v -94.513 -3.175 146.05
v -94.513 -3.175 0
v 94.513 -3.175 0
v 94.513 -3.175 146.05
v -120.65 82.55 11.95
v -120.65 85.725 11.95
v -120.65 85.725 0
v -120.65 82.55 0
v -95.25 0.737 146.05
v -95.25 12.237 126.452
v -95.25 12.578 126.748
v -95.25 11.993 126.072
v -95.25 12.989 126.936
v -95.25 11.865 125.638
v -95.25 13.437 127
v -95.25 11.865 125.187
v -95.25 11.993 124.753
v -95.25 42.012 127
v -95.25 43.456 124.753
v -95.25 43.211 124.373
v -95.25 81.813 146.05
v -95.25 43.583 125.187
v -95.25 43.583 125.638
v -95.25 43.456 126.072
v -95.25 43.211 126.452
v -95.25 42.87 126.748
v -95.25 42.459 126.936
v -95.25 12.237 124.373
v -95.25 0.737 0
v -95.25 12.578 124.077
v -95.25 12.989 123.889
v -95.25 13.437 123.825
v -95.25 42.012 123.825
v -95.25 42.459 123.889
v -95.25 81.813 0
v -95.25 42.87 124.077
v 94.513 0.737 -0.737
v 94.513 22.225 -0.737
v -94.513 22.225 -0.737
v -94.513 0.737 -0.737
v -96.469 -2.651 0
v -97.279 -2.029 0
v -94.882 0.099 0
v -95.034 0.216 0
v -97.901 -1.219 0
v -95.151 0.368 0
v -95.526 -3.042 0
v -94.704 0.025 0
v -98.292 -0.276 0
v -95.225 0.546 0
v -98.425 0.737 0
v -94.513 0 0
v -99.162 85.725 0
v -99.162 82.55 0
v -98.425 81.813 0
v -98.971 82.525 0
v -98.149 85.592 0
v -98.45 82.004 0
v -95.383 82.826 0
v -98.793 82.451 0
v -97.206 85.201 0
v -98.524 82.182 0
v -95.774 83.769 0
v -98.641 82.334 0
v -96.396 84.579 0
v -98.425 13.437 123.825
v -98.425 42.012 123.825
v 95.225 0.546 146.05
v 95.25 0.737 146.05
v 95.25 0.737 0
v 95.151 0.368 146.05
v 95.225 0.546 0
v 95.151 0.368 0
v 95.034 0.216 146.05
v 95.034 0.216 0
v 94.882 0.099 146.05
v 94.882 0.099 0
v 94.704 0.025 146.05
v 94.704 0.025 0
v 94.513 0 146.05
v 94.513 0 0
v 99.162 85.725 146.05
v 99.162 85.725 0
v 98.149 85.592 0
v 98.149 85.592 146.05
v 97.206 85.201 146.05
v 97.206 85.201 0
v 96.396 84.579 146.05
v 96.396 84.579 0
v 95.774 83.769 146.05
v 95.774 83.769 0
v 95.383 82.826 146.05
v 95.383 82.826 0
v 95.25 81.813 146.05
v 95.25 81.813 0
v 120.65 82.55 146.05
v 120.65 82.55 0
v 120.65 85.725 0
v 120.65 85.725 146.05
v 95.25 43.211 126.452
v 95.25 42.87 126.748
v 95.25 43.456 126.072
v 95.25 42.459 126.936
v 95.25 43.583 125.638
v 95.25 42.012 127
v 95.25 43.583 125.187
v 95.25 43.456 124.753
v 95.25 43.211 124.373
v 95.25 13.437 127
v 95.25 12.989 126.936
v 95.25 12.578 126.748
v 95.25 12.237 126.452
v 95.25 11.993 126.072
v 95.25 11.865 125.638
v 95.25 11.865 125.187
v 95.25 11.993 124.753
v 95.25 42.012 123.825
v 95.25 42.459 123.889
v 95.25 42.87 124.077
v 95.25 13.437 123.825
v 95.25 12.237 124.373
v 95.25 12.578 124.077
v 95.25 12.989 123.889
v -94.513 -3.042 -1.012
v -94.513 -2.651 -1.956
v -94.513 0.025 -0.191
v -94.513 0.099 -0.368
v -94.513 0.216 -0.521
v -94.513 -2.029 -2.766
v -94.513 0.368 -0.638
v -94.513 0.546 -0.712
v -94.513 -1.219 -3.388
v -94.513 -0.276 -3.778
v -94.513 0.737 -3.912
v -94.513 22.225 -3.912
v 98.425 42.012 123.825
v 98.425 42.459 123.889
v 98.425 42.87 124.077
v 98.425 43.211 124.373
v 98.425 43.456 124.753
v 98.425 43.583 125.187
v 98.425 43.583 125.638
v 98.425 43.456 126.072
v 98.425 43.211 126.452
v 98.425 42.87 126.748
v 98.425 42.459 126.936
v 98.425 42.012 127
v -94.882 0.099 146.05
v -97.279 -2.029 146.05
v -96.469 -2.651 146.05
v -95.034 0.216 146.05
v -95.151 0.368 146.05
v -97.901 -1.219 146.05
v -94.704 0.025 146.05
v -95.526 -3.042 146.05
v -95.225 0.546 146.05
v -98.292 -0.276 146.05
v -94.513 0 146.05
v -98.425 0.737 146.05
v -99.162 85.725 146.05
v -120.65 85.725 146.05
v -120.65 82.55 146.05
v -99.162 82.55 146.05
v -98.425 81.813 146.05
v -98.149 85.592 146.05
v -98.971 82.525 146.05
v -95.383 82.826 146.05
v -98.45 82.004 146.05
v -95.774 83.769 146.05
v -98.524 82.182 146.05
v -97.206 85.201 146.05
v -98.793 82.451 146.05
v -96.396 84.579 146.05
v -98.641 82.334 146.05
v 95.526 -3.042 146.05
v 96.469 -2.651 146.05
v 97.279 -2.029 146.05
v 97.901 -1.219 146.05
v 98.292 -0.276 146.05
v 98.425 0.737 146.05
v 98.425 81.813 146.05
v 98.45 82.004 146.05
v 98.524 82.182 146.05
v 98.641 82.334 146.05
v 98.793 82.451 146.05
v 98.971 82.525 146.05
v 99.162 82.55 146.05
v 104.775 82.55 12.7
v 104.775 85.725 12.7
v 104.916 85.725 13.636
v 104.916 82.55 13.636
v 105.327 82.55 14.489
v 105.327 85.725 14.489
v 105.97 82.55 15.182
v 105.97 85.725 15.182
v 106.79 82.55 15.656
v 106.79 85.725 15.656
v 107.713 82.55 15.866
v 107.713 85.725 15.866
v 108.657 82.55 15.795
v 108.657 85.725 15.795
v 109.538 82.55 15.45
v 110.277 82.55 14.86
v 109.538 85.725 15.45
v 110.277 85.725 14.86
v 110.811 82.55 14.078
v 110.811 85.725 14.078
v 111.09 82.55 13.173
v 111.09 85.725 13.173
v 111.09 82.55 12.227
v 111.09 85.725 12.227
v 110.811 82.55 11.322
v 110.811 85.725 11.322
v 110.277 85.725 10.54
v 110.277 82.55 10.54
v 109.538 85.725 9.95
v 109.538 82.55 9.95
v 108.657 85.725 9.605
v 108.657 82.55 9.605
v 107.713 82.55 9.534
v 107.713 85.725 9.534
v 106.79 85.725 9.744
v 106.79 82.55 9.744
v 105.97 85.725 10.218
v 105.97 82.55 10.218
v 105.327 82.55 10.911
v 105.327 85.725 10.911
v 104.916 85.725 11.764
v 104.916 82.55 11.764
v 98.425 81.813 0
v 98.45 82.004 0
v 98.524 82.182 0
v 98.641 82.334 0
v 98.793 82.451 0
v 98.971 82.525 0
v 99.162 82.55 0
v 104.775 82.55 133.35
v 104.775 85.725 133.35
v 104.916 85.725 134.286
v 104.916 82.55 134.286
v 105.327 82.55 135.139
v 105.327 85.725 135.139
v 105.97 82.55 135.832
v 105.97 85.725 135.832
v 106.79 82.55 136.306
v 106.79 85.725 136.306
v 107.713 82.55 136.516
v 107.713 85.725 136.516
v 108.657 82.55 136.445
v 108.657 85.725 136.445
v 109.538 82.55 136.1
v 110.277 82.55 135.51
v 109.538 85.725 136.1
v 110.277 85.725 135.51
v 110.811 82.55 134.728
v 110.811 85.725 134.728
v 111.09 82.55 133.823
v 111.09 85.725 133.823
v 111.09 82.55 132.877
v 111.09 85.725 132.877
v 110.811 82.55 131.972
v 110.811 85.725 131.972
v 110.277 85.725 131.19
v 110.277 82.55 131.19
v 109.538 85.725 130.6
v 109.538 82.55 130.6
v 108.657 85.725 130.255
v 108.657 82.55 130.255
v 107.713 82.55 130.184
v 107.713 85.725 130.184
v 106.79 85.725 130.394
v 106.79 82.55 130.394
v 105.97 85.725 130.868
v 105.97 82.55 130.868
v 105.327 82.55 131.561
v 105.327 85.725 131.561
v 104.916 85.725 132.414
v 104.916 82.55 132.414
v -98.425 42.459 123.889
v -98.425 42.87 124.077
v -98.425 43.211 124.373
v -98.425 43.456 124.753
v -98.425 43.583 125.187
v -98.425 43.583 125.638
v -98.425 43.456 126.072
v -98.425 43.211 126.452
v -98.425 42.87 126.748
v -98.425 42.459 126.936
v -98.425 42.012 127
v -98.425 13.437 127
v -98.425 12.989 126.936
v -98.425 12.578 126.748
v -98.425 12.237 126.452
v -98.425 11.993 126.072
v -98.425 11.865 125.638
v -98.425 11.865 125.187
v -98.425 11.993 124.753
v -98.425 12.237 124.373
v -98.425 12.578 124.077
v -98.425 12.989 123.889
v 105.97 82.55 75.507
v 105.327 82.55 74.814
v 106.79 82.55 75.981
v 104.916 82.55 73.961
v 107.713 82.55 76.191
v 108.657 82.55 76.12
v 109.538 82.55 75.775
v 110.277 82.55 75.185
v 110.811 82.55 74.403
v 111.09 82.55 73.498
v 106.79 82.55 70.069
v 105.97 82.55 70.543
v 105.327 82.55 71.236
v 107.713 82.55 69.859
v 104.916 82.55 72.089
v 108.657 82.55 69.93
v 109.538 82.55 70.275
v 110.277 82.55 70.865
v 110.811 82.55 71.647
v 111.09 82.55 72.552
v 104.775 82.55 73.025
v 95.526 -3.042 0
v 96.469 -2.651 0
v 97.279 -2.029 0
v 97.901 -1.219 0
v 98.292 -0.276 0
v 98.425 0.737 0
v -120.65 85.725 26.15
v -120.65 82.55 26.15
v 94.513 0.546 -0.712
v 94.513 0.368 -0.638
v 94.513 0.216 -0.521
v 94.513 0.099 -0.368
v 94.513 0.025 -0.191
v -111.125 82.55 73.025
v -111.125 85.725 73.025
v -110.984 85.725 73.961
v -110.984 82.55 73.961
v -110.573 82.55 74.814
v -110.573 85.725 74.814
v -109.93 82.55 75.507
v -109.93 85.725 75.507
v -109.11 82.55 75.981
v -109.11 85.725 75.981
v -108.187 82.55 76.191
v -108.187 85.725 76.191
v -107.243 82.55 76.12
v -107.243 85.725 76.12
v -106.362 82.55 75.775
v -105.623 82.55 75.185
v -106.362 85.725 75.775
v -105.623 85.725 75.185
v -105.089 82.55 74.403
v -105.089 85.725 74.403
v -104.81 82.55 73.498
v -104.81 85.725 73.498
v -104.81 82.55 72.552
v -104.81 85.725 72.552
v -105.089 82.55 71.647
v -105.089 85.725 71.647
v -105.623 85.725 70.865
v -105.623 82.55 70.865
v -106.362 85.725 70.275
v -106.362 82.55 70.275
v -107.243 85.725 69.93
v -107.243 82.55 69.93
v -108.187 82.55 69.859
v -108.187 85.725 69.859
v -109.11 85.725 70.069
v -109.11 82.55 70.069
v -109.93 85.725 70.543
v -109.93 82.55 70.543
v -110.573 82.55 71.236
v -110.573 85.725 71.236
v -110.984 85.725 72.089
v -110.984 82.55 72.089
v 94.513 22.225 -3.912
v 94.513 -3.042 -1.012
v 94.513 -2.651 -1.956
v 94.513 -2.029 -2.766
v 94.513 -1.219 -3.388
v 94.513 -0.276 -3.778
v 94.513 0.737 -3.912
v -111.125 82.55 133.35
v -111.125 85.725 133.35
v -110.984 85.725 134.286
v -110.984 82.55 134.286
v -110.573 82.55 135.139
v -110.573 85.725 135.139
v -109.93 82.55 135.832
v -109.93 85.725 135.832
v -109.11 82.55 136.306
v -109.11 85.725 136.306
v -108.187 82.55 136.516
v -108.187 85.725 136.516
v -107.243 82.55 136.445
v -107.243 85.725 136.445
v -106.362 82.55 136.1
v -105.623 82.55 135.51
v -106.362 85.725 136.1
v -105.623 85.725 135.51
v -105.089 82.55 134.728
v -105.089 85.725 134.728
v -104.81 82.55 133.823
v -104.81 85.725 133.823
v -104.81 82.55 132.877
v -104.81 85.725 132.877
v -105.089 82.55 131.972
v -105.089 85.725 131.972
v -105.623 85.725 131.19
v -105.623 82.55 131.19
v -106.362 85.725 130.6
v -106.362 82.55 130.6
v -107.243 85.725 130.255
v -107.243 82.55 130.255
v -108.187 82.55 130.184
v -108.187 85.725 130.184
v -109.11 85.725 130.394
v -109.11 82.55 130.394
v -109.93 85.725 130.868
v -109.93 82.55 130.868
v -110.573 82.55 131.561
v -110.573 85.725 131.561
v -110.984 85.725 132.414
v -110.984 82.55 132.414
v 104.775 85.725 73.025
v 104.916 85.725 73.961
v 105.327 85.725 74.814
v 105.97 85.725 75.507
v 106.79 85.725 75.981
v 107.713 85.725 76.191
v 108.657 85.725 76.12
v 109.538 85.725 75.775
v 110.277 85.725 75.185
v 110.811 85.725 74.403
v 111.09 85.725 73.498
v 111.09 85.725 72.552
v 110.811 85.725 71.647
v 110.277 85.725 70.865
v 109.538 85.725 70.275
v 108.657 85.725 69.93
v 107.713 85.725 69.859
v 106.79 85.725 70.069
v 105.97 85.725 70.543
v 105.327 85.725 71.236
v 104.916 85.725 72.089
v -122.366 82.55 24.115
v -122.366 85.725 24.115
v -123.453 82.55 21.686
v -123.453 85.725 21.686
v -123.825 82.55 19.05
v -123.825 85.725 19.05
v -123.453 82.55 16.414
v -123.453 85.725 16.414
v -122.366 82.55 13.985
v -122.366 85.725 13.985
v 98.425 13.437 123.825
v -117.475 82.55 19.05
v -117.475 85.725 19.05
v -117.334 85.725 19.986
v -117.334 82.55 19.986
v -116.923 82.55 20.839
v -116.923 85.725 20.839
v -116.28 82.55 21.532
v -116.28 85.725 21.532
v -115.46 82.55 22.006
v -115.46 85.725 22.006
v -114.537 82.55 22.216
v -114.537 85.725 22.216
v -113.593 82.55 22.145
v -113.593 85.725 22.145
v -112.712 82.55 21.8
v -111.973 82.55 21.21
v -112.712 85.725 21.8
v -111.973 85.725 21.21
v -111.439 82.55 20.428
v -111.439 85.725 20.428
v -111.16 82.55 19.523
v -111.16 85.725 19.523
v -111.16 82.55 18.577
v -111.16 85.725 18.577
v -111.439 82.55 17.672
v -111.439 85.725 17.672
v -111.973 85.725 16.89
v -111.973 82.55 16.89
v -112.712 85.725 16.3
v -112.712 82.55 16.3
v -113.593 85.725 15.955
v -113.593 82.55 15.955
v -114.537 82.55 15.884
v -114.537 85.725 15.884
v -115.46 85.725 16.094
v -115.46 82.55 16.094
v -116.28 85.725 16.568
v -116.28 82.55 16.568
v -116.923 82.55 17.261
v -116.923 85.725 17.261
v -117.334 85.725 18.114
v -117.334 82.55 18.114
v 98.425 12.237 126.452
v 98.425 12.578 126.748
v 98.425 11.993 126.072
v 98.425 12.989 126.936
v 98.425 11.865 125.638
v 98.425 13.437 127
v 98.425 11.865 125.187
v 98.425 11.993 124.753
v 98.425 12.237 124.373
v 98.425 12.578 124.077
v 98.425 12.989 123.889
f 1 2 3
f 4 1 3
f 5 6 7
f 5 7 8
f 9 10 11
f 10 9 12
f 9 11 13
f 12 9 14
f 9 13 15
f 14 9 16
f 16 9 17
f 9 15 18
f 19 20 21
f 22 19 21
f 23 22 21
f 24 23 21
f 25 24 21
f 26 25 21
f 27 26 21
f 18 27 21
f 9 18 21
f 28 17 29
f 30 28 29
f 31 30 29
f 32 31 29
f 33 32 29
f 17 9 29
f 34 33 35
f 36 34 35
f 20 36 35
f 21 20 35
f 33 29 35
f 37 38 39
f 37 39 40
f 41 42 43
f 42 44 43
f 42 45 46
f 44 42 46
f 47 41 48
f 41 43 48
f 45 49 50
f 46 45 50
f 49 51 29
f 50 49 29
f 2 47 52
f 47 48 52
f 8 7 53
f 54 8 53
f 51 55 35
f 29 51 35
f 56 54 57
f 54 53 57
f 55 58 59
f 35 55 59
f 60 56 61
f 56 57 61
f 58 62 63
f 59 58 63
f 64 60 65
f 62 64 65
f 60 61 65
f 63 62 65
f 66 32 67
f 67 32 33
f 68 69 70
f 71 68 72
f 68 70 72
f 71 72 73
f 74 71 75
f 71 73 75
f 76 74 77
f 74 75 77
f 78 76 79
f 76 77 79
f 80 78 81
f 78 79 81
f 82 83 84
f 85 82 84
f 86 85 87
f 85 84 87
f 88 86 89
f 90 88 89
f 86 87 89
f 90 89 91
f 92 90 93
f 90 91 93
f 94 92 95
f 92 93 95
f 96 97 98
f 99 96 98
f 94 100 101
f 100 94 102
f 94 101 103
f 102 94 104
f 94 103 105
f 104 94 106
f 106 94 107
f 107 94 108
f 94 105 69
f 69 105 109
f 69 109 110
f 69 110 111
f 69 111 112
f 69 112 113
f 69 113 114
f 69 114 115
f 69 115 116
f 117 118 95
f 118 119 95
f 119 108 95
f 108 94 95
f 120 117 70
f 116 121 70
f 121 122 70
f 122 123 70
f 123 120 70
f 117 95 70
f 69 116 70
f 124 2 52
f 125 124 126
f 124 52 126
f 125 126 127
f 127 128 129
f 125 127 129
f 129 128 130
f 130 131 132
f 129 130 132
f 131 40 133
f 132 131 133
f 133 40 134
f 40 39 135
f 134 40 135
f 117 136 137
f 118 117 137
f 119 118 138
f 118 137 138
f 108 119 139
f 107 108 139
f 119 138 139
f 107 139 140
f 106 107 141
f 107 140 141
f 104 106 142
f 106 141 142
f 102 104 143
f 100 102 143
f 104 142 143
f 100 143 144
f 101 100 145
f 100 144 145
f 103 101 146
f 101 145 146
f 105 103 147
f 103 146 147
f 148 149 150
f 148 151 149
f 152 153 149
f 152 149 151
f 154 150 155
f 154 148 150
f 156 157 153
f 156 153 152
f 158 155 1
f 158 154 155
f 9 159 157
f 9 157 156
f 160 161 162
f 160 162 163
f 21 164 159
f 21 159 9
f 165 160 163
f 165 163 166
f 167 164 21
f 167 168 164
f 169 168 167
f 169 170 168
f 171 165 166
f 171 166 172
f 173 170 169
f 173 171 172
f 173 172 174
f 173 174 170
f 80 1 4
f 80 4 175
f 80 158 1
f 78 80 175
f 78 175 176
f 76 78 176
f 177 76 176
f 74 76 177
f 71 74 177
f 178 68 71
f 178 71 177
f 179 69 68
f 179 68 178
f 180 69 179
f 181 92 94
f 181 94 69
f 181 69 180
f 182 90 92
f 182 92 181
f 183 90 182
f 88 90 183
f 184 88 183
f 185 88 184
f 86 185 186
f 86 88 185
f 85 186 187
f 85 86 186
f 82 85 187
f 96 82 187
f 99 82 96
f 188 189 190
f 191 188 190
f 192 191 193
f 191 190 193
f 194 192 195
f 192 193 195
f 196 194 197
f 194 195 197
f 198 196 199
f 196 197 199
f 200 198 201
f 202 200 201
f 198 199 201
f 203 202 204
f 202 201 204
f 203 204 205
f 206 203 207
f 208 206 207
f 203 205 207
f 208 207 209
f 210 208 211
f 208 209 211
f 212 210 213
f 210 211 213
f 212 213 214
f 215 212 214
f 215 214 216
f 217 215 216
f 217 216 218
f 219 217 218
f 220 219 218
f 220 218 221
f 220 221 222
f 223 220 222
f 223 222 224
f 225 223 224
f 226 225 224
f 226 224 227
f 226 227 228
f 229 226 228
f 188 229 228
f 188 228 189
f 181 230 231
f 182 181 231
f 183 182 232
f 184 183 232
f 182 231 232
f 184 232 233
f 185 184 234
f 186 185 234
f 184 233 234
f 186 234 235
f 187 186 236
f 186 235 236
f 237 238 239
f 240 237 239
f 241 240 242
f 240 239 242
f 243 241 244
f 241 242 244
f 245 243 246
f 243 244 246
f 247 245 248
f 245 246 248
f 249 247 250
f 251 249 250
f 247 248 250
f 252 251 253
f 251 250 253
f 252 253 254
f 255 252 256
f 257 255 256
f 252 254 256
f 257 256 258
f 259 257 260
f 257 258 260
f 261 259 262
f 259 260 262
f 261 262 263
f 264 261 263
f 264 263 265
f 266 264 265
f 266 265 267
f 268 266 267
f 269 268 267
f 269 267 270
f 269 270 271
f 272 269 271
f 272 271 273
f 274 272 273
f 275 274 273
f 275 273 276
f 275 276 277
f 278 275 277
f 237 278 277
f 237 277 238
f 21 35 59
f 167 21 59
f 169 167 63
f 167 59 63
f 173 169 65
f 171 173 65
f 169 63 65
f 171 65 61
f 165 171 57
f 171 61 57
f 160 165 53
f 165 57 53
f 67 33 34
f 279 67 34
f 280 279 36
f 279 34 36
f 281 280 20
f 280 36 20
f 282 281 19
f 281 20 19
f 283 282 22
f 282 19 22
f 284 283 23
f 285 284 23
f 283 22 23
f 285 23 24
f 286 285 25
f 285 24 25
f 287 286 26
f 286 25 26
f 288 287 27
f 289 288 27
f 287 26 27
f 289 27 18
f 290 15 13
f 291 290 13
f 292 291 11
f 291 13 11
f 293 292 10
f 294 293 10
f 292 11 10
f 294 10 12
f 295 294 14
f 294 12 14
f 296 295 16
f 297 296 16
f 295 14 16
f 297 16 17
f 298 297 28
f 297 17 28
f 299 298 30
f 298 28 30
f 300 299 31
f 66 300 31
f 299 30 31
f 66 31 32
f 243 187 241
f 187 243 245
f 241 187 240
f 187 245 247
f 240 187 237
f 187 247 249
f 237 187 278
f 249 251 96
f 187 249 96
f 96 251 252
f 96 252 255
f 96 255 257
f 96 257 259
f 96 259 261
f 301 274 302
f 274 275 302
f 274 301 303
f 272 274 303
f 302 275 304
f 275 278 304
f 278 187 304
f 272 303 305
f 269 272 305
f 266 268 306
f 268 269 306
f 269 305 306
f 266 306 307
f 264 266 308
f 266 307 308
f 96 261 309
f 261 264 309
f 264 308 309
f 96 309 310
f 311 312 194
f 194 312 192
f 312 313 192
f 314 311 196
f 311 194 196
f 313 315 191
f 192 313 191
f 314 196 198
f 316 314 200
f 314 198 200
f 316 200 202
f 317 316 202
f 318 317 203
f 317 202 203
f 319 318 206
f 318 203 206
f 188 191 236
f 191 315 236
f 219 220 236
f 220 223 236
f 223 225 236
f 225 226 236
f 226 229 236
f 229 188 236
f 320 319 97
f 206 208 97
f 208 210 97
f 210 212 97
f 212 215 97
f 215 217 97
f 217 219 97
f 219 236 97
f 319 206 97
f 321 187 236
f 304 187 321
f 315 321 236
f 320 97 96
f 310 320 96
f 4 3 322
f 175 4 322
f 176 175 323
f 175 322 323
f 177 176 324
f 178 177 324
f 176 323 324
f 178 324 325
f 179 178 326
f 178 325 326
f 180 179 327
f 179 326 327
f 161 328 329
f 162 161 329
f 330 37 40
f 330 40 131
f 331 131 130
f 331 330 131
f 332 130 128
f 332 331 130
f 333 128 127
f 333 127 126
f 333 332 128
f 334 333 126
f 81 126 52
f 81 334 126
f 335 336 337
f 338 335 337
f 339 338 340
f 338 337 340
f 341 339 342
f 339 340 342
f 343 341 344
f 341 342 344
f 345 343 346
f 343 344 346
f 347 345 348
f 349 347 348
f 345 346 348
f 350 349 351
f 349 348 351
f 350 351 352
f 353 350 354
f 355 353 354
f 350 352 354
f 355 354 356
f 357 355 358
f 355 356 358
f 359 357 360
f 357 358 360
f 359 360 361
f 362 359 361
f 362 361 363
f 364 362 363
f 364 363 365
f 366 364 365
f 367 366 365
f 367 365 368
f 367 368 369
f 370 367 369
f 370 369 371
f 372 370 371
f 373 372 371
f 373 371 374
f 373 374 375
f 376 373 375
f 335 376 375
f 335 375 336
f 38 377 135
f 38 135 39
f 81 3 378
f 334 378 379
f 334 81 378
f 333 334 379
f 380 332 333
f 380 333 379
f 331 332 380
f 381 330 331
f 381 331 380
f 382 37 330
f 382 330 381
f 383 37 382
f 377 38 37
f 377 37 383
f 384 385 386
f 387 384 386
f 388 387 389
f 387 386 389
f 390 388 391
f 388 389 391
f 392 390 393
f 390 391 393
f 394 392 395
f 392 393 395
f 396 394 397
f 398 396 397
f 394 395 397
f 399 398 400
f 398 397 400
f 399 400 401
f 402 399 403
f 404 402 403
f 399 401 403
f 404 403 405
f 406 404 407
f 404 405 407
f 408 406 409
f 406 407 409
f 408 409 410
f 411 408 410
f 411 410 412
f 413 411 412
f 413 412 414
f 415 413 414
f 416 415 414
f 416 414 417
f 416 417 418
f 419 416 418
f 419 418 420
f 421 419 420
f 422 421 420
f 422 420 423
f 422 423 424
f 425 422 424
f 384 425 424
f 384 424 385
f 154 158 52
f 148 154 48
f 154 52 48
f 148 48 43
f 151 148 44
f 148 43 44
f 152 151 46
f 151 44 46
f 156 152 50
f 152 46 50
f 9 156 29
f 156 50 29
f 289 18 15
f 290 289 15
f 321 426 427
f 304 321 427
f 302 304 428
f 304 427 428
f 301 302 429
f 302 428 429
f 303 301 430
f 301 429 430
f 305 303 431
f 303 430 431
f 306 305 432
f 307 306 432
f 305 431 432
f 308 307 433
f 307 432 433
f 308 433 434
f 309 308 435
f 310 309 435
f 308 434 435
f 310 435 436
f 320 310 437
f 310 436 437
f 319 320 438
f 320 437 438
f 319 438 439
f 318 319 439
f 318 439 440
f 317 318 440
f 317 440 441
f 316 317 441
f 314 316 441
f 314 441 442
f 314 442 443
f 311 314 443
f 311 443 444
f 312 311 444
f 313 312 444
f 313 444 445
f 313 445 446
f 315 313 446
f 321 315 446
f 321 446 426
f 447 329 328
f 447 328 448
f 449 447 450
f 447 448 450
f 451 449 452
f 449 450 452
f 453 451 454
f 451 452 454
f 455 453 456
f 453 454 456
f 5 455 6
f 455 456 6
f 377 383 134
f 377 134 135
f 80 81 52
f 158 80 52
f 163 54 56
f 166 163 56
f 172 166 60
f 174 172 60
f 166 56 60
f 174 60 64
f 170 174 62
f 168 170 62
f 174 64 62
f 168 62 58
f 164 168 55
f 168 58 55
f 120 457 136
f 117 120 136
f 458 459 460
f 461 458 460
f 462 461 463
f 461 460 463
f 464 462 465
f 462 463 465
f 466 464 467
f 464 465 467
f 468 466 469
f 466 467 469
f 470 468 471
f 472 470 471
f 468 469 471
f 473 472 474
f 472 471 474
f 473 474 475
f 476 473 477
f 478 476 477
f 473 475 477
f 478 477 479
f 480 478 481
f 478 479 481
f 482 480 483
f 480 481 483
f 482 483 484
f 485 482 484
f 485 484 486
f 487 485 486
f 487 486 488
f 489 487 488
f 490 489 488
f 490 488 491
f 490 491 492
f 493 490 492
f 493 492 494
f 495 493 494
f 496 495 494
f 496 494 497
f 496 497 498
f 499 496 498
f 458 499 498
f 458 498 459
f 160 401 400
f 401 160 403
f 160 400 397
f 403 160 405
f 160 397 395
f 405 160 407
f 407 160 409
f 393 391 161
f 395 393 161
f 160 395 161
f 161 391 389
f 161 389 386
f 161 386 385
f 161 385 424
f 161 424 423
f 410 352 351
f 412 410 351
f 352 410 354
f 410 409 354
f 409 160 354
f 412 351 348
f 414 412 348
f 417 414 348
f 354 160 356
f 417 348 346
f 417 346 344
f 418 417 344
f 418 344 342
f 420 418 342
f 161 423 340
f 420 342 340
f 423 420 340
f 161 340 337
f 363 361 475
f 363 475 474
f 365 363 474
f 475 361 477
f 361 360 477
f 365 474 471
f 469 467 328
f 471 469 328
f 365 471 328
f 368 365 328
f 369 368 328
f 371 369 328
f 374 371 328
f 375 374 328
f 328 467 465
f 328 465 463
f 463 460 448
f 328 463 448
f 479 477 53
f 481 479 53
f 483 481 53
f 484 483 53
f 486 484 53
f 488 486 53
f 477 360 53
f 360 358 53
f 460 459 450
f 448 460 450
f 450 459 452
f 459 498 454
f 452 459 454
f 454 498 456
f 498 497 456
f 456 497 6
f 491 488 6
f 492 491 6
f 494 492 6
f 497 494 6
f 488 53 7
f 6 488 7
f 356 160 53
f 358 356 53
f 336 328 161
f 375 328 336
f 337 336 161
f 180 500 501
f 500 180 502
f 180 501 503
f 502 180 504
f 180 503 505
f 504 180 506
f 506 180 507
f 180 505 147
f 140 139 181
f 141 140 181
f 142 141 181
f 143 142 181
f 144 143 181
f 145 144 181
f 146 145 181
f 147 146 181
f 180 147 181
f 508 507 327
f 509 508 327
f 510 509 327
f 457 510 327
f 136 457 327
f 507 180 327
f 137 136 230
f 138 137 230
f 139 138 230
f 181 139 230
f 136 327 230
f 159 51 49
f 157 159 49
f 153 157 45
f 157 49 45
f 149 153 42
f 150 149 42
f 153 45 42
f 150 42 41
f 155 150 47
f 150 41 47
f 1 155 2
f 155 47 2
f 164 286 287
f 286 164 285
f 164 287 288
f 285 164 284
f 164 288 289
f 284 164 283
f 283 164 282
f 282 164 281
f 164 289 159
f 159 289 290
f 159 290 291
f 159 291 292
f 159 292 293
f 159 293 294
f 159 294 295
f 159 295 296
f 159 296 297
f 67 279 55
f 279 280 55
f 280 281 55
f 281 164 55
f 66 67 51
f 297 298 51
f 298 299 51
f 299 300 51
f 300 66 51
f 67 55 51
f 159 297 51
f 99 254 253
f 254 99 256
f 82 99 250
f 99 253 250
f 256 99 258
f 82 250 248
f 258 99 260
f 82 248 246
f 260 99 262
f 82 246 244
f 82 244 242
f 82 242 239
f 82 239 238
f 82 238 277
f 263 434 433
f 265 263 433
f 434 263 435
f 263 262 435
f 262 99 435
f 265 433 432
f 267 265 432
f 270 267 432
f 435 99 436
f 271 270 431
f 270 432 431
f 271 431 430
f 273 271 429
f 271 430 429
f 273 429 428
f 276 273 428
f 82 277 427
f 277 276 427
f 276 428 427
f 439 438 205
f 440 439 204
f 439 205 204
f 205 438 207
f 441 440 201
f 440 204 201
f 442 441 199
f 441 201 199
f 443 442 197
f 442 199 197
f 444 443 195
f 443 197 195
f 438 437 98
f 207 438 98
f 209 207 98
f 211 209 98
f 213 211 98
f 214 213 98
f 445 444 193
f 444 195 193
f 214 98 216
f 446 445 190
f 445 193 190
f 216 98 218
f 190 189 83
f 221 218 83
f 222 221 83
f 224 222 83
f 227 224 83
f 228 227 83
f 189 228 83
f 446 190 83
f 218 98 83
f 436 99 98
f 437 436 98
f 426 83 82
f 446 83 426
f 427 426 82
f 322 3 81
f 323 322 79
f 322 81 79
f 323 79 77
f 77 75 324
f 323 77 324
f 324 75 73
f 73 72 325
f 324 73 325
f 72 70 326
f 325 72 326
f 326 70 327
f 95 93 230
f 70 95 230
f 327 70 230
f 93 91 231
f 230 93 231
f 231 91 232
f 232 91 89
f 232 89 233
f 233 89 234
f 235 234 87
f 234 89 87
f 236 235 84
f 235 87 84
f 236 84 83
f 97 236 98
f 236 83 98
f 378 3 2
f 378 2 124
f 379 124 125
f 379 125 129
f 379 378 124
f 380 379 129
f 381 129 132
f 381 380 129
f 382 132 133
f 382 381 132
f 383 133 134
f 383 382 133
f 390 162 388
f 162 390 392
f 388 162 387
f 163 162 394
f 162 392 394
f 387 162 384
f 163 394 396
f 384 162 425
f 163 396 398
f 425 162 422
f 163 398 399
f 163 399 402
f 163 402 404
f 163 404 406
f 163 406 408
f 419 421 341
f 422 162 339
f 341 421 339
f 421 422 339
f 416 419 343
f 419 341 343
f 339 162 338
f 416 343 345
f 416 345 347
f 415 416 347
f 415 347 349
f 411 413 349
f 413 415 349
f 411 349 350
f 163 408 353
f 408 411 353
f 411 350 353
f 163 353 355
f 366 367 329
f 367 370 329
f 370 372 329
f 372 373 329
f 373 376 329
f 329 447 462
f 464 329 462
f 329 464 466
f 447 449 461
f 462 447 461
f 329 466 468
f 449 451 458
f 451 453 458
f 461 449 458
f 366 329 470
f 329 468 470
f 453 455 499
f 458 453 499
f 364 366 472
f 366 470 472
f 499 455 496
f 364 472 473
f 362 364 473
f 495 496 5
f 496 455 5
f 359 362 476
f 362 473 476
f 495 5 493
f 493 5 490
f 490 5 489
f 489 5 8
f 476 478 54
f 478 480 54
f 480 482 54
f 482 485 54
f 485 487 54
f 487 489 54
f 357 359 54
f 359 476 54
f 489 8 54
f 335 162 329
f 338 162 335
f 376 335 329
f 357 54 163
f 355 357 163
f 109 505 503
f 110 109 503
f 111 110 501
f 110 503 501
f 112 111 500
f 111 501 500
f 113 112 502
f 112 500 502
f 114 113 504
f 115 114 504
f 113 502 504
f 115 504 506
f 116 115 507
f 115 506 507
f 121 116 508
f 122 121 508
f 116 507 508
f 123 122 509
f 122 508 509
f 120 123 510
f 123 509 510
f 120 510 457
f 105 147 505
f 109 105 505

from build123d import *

# Parameters (mm, degrees)
BASE_FLANGE1_DEPTH      = 146.05
EDGE_FLANGE1_DEPTH      = 189.0268
SKETCH9_R               = 3.175
CUT_EXTRUDE1_DEPTH      = 210.261164577
CUT_EXTRUDE2_DEPTH      = 208.932201991
CUT_EXTRUDE2_DEPTH_BACK = 208.932201991
TAB1_START              = -3.175
SKETCH15_R              = 9.525
SKETCH15_R_2            = 3.175
TAB1_DEPTH              = 3.175


# Sheet-metal steps are written as plain solids
with BuildPart() as part:
    # Sketch1 → Base-Flange1 (new body)
    with BuildSketch(Plane.XY):
        with BuildLine():
            Line((120.65, 85.725), (99.1616, 85.725))
            ThreePointArc((99.1616, 85.725), (96.395681115, 84.579318885), (95.25, 81.8134))
            Line((95.25, 81.8134), (95.25, 0.7366))
            ThreePointArc((95.25, 0.7366), (95.034254855, 0.215745145), (94.5134, 0))
            Line((94.5134, 0), (-94.5134, 0))
            ThreePointArc((-94.5134, 0), (-95.034254855, 0.215745145), (-95.25, 0.7366))
            Line((-95.25, 0.7366), (-95.25, 81.8134))
            ThreePointArc((-95.25, 81.8134), (-96.395681115, 84.579318885), (-99.1616, 85.725))
            Line((-99.1616, 85.725), (-120.65, 85.725))
            Line((-120.65, 85.725), (-120.65, 82.55))
            Line((-120.65, 82.55), (-99.1616, 82.55))
            ThreePointArc((-99.1616, 82.55), (-98.640745145, 82.334254855), (-98.425, 81.8134))
            Line((-98.425, 81.8134), (-98.425, 0.7366))
            ThreePointArc((-98.425, 0.7366), (-97.279318885, -2.029318885), (-94.5134, -3.175))
            Line((-94.5134, -3.175), (94.5134, -3.175))
            ThreePointArc((94.5134, -3.175), (97.279318885, -2.029318885), (98.425, 0.7366))
            Line((98.425, 0.7366), (98.425, 81.8134))
            ThreePointArc((98.425, 81.8134), (98.640745145, 82.334254855), (99.1616, 82.55))
            Line((99.1616, 82.55), (120.65, 82.55))
            Line((120.65, 82.55), (120.65, 85.725))
        make_face()
    extrude(amount=BASE_FLANGE1_DEPTH)

    # Edge-Flange1 section (across the edge) → Edge-Flange1 (add)
    with BuildSketch(Plane(origin=(94.5134, 0, -0.7366), x_dir=(0, 0, 1), z_dir=(-1, 0, 0))):
        with BuildLine():
            Line((-3.175, 0.7366), (-3.175, 22.225))
            Line((-3.175, 22.225), (0, 22.225))
            Line((0, 22.225), (0, 0.7366))
            ThreePointArc((0, 0.7366), (0.215745145, 0.215745145), (0.7366, 0))
            Line((0.7366, 0), (0.7366, -3.175))
            ThreePointArc((0.7366, -3.175), (-2.029318885, -2.029318885), (-3.175, 0.7366))
        make_face()
    extrude(amount=EDGE_FLANGE1_DEPTH)

    # Sketch9 → Cut-Extrude1 (cut, through all)
    with BuildSketch(Plane(origin=(0, 85.725, 0), x_dir=(1, 0, 0), z_dir=(0, 1, 0))):
        with Locations(Location((-114.3, -19.05, 0), (0, 0, 180))):
            Circle(SKETCH9_R)
        with Locations(Location((-107.95, -73.025, 0), (0, 0, 180))):
            Circle(SKETCH9_R)
        with Locations(Location((-107.95, -133.35, 0), (0, 0, 180))):
            Circle(SKETCH9_R)
        with Locations(Location((107.95, -133.35, 0), (0, 0, 180))):
            Circle(SKETCH9_R)
        with Locations(Location((107.95, -73.025, 0), (0, 0, 180))):
            Circle(SKETCH9_R)
        with Locations(Location((107.95, -12.7, 0), (0, 0, 180))):
            Circle(SKETCH9_R)
    extrude(amount=-CUT_EXTRUDE1_DEPTH, mode=Mode.SUBTRACT)

    # Sketch14 → Cut-Extrude2 (cut, two sides: drawn at the far end of the back side and taken through both)
    with BuildSketch(Plane(origin=(0, 0, 0), x_dir=(0, 1, 0), z_dir=(-1, 0, 0)).offset(-CUT_EXTRUDE2_DEPTH_BACK)):
        with BuildLine():
            Line((42.0116, -127), (13.4366, -127))
            ThreePointArc((13.4366, -127), (11.8491, -125.4125), (13.4366, -123.825))
            Line((13.4366, -123.825), (42.0116, -123.825))
            ThreePointArc((42.0116, -123.825), (43.5991, -125.4125), (42.0116, -127))
        make_face()
    extrude(amount=CUT_EXTRUDE2_DEPTH + CUT_EXTRUDE2_DEPTH_BACK, mode=Mode.SUBTRACT)

    # Sketch15 → Tab1 (add)
    with BuildSketch(Plane.XZ.offset(-82.55).offset(TAB1_START)):
        with Locations((-114.3, 19.05)):
            Circle(SKETCH15_R)
        with Locations(Location((-114.3, 19.05, 0), (0, 0, 180))):
            Circle(SKETCH15_R_2, mode=Mode.SUBTRACT)
    extrude(amount=TAB1_DEPTH)


solid = part.part
